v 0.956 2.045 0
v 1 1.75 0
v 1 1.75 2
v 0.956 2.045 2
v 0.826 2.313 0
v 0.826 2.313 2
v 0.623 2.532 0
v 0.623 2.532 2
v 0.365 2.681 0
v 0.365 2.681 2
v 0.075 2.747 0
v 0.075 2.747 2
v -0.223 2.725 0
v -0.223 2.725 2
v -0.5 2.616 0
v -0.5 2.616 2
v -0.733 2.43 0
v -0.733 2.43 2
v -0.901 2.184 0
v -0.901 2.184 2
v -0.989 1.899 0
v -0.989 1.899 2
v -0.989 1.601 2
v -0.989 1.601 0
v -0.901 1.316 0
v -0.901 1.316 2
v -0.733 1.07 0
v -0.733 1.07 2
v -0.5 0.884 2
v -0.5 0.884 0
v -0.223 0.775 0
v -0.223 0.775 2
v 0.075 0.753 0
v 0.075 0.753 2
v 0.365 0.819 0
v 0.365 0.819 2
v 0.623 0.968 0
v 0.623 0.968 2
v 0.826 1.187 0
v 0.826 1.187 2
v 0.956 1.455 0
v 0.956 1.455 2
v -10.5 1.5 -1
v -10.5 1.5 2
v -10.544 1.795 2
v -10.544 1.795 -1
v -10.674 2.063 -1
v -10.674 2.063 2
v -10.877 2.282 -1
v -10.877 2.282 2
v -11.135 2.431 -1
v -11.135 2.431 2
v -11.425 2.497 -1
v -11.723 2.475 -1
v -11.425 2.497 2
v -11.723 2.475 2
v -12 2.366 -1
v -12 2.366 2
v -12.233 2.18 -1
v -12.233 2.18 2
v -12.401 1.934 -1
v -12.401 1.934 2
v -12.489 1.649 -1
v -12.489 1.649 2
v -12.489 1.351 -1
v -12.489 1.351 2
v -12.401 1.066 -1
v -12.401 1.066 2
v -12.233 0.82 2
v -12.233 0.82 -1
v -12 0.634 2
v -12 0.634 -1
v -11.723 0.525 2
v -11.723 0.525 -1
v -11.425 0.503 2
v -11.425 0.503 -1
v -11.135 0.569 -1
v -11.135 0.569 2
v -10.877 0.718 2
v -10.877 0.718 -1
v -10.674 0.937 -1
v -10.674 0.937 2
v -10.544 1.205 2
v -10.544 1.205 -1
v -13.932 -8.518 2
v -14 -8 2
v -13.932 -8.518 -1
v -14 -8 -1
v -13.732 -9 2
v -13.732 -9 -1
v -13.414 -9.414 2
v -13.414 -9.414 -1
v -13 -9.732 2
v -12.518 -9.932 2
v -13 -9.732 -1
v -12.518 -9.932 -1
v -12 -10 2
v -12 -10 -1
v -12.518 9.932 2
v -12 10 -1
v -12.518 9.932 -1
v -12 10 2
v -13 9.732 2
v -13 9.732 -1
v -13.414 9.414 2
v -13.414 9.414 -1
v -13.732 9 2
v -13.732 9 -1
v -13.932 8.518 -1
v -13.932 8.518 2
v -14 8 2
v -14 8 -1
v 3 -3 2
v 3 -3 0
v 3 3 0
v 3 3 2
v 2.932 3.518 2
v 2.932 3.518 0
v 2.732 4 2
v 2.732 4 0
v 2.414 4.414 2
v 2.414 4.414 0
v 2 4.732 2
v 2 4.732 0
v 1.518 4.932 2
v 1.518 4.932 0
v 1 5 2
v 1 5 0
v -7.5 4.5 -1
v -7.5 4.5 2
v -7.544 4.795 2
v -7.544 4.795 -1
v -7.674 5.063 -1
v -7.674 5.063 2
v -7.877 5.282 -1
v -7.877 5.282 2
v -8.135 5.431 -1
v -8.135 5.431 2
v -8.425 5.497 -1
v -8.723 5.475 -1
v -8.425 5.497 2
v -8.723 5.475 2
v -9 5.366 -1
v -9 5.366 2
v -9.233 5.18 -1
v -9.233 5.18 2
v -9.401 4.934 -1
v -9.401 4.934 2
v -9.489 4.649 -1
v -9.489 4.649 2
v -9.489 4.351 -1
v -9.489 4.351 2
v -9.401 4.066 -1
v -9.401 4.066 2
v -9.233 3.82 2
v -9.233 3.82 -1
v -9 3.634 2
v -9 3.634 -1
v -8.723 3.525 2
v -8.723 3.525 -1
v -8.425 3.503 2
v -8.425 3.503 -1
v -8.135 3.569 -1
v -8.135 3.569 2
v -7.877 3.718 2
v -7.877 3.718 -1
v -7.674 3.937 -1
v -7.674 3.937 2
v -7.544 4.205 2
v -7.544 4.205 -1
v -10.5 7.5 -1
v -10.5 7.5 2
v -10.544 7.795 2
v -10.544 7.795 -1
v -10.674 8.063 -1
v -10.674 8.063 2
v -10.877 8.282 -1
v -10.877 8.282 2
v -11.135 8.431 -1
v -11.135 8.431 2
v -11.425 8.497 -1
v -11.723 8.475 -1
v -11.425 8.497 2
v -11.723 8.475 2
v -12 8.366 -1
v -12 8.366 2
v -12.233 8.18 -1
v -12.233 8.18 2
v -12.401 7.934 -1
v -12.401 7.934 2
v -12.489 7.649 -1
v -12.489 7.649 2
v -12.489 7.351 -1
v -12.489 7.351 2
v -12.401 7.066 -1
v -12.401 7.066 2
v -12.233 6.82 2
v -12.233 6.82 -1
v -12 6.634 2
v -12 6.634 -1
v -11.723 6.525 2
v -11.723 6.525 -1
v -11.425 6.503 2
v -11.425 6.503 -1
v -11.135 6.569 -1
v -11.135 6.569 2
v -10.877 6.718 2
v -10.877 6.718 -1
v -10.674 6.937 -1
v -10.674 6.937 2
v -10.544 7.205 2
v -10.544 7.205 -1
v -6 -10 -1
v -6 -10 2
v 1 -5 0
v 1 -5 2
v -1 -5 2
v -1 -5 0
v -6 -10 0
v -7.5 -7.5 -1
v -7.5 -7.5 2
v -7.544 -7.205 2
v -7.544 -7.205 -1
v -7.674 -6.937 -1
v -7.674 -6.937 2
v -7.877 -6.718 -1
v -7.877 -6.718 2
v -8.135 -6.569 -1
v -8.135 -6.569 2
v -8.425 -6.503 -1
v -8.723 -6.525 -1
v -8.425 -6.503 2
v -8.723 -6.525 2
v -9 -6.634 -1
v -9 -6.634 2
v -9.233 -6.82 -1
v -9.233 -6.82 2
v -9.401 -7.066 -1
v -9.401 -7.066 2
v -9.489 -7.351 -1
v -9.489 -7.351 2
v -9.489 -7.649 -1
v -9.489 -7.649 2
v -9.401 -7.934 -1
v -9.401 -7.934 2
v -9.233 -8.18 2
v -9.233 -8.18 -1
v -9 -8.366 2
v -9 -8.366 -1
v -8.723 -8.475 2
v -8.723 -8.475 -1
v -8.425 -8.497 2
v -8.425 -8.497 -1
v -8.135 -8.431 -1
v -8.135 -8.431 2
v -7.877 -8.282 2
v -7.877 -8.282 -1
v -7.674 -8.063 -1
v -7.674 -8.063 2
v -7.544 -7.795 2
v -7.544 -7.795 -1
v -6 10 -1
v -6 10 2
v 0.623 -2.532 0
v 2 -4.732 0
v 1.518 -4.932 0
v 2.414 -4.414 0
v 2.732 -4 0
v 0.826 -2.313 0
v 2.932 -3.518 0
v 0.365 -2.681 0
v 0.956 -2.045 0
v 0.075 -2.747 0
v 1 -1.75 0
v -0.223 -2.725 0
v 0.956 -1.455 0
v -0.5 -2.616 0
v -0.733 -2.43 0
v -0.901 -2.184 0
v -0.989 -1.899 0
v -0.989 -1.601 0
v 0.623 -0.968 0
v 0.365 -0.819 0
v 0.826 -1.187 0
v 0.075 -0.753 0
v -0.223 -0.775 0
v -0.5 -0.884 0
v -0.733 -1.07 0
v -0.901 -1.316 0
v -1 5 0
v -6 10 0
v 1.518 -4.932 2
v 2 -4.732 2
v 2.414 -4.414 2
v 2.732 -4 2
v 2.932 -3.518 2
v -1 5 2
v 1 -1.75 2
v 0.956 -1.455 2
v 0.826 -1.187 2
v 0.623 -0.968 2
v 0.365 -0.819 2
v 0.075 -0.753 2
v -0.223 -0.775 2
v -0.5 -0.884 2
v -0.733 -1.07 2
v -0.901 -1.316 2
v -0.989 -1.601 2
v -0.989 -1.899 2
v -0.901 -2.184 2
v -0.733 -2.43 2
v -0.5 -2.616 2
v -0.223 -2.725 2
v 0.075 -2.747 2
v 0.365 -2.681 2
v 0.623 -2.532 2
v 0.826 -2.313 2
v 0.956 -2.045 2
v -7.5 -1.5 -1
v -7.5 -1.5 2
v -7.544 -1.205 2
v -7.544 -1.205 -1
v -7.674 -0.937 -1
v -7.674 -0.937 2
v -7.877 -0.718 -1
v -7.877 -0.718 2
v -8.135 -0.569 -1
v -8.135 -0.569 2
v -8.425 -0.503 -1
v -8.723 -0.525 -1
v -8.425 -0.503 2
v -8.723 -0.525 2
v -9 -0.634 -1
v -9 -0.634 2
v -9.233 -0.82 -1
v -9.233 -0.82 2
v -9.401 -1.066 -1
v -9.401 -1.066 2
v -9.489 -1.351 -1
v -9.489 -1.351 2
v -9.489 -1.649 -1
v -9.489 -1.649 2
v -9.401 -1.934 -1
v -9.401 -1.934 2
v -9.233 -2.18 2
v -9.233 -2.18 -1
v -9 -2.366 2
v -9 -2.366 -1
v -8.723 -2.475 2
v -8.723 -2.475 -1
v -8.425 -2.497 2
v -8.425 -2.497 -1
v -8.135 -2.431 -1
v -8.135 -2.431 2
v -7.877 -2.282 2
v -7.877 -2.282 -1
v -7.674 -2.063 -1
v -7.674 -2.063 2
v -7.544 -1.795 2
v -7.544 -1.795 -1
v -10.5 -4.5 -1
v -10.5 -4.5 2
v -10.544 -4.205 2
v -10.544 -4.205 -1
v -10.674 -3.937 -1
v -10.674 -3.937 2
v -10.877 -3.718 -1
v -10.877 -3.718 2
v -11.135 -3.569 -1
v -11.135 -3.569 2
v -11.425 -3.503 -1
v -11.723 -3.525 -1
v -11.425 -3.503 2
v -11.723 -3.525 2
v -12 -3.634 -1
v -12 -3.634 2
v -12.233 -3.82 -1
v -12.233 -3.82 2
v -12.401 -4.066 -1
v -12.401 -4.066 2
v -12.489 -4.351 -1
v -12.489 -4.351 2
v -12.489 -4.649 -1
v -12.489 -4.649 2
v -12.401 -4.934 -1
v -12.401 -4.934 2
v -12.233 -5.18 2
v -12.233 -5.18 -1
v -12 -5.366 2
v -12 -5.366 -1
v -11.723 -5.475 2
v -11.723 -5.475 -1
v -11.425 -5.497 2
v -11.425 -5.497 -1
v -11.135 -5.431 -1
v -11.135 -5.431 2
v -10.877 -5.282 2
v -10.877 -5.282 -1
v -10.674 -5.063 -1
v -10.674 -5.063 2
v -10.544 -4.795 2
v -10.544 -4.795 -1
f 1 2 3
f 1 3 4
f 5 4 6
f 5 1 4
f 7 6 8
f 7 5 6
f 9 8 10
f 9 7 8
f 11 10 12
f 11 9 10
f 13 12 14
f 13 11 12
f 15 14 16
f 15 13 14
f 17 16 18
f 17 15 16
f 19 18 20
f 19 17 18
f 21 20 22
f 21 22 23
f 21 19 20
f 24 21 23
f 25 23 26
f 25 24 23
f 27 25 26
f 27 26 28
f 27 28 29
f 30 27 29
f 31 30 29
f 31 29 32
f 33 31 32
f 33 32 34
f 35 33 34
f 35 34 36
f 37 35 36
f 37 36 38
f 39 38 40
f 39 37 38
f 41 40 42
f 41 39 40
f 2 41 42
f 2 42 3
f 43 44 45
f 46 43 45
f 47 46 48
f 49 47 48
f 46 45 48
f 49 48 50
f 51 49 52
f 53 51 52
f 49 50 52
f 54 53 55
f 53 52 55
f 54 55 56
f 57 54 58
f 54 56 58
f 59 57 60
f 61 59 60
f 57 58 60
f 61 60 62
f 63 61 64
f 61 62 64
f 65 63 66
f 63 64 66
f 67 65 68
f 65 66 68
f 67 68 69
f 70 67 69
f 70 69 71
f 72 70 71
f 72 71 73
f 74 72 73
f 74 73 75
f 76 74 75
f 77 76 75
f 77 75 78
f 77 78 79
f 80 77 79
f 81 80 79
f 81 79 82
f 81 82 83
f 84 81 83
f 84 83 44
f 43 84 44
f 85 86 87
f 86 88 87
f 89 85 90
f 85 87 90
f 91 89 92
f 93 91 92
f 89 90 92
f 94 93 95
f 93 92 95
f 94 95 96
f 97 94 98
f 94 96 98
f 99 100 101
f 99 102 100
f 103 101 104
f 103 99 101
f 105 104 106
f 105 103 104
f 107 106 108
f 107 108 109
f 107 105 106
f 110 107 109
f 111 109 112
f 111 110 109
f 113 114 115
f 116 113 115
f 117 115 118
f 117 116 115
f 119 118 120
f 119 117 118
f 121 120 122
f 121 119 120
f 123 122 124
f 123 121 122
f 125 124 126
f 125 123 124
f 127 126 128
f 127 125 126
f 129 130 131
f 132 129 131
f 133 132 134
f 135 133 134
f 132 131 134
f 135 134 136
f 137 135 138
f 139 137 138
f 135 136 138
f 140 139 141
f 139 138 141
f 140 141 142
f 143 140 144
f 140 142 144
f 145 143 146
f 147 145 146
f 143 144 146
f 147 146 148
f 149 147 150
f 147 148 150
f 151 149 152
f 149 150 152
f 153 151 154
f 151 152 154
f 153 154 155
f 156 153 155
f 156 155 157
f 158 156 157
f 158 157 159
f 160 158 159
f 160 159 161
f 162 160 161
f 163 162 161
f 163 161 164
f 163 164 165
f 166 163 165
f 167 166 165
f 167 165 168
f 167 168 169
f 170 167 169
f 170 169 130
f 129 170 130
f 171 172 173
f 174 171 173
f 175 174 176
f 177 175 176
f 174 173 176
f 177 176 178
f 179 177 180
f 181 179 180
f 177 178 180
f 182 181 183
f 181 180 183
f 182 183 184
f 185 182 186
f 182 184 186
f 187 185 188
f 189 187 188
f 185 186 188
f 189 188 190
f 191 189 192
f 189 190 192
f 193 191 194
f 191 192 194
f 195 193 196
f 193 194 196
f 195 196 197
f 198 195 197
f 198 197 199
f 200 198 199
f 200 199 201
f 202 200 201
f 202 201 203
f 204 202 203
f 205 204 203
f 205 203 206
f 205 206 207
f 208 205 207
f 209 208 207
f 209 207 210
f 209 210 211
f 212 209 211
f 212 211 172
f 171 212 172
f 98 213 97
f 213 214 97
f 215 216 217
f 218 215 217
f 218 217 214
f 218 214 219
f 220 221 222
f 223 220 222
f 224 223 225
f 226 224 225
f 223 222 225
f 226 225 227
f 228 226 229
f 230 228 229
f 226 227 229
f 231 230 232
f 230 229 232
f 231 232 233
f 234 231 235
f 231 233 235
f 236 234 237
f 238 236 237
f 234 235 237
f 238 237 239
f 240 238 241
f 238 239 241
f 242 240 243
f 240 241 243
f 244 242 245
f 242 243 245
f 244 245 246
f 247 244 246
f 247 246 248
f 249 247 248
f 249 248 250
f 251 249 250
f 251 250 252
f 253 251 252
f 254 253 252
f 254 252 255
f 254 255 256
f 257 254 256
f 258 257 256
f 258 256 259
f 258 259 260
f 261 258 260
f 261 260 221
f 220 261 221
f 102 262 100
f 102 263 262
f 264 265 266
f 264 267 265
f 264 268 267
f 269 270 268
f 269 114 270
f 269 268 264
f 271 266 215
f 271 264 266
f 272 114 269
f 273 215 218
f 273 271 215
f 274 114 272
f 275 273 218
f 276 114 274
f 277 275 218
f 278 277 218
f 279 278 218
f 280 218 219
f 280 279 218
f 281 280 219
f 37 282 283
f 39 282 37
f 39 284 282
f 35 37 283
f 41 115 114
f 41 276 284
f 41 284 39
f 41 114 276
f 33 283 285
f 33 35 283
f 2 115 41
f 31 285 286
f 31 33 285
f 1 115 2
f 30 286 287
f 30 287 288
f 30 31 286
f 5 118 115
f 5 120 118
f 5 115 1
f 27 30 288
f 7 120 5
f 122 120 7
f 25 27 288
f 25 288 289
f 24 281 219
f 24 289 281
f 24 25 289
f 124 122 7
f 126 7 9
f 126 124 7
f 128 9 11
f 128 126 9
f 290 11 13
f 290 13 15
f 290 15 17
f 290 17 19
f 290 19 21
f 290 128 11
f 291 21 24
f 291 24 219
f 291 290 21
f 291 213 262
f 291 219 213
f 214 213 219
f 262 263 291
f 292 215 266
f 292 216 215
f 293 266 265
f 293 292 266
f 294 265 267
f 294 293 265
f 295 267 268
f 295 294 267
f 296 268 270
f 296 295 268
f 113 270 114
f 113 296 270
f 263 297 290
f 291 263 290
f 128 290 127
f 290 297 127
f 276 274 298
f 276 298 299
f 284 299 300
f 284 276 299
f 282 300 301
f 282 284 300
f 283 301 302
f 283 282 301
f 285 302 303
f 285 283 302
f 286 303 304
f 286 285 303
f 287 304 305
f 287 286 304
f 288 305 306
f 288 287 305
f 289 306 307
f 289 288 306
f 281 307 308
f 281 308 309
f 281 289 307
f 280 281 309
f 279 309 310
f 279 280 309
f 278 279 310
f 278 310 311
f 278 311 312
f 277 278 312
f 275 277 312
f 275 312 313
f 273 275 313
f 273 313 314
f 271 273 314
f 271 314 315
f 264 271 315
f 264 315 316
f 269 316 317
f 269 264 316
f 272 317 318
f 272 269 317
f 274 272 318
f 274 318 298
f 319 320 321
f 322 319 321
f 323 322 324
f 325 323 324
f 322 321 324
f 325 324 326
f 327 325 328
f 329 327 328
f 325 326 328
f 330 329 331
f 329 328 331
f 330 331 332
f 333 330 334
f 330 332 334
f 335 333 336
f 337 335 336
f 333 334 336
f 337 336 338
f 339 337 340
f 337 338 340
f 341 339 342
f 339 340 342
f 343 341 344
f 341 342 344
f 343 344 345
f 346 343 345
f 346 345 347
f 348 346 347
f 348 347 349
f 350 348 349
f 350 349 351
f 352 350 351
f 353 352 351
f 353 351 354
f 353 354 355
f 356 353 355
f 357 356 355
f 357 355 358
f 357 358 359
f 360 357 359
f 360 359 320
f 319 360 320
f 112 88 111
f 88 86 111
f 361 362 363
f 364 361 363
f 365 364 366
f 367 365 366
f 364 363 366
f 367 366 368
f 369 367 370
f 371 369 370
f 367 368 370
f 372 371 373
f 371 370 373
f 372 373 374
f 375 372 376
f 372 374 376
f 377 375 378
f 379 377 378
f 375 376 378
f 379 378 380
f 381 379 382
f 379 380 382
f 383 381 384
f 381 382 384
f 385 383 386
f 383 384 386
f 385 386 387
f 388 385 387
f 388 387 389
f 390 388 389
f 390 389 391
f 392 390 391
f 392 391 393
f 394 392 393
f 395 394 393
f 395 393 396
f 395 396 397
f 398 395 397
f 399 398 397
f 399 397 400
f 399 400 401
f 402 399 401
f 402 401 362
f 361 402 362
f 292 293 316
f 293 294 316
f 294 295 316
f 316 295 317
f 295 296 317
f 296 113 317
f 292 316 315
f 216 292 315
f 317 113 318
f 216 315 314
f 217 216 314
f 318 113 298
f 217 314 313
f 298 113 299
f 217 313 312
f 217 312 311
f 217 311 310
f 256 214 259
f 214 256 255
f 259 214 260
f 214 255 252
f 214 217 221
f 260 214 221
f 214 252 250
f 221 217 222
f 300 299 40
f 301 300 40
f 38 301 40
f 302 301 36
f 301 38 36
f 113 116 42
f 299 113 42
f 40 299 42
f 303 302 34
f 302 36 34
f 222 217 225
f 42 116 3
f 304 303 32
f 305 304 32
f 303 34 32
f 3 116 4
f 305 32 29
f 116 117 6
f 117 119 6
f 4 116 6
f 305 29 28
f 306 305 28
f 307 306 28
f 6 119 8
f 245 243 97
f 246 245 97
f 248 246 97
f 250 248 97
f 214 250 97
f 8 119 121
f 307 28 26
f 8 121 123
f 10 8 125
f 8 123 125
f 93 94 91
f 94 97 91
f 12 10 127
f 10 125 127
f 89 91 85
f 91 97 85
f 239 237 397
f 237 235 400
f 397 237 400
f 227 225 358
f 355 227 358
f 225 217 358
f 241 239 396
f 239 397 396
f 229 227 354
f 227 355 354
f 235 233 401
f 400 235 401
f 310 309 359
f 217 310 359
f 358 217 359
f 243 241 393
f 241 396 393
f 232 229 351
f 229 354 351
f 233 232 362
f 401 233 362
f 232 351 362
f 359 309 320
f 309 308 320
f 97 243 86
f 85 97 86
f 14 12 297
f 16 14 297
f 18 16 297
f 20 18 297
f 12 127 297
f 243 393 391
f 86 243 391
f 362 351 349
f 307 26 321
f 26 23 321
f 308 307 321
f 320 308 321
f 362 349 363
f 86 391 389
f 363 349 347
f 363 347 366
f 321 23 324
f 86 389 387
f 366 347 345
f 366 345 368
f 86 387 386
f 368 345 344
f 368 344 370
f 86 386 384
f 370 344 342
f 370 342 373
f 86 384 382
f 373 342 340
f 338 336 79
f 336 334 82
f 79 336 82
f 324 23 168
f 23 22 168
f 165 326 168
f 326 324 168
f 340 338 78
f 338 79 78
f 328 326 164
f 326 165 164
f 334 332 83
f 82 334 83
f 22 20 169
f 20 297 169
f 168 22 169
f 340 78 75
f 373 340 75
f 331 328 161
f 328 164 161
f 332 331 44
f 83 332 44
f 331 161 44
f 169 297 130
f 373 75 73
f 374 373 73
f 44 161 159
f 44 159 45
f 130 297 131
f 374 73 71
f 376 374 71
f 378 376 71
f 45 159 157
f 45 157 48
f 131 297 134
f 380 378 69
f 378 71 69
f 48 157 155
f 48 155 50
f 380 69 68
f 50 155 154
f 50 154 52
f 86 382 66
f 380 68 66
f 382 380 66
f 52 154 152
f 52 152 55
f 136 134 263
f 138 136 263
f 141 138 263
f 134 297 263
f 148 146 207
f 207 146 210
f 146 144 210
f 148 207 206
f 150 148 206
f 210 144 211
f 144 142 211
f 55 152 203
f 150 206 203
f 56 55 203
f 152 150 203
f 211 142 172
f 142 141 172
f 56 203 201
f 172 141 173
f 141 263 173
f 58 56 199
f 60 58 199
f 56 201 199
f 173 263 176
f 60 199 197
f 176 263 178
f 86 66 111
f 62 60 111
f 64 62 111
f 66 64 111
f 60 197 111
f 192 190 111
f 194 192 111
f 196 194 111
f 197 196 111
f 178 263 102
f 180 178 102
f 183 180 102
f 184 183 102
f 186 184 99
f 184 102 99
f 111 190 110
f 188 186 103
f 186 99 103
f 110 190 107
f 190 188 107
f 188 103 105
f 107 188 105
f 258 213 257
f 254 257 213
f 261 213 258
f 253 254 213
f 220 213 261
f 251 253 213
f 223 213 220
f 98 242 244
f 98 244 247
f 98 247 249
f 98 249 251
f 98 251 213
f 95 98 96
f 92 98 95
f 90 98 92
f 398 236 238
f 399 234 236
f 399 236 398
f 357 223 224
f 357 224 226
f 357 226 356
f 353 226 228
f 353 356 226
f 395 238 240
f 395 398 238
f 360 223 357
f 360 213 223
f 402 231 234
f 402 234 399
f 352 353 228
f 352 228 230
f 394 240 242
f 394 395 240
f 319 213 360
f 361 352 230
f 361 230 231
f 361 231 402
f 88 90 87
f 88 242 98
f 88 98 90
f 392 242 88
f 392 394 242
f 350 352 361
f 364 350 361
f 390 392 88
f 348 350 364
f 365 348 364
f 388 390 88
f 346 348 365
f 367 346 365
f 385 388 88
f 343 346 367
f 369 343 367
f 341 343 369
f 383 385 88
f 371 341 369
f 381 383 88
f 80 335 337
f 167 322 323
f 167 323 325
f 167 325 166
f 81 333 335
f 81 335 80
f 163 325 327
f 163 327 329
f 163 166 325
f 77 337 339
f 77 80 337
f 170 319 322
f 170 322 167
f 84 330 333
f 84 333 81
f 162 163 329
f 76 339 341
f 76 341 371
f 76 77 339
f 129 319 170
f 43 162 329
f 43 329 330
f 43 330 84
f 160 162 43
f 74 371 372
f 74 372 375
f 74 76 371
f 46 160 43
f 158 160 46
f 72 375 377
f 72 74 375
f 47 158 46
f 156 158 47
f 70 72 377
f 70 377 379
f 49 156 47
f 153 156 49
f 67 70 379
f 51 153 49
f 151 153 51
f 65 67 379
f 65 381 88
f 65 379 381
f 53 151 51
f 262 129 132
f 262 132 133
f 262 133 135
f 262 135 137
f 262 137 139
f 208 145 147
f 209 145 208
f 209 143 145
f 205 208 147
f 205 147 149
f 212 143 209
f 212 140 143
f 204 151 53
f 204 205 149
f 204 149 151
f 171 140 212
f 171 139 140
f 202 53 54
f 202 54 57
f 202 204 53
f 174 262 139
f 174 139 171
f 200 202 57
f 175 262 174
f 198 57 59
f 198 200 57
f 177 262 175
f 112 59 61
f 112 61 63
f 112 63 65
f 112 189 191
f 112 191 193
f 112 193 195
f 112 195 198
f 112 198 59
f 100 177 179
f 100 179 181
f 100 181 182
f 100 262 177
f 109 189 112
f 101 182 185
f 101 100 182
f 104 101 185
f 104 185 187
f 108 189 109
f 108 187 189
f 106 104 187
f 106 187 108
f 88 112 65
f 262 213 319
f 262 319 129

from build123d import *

# Parameters (mm, degrees)
SKETCH1_W           = 6
SKETCH1_H           = 10
SKETCH1_R           = 1
BOSS_EXTRUDE1_DEPTH = 2
BOSS_EXTRUDE2_DEPTH = 2
SKETCH3_W           = 8
SKETCH3_H           = 20
BOSS_EXTRUDE3_DEPTH = 1
SKETCH4_R           = 1
CUT_EXTRUDE1_DEPTH  = 5
LPATTERN1_COUNT     = 3
LPATTERN1_PITCH     = 6
CHAMFER1_SIZE       = 5
FILLET1_R           = 2


with BuildPart() as part:
    # Sketch1 → Boss-Extrude1 (new body)
    with BuildSketch(Plane.XY):
        Rectangle(SKETCH1_W, SKETCH1_H)
        with Locations((0, 1.75)):
            Circle(SKETCH1_R, mode=Mode.SUBTRACT)
        with Locations((0, -1.75)):
            Circle(SKETCH1_R, mode=Mode.SUBTRACT)
    extrude(amount=BOSS_EXTRUDE1_DEPTH)

    # Sketch2 → Boss-Extrude2 (add)
    with BuildSketch(Plane.XY.offset(2)):
        Polygon((-14, -10), (-14, 10), (-6, 10), (-6, 5), (-3, 5), (-3, -5), (-6, -5), (-6, -10), align=None)
    extrude(amount=-BOSS_EXTRUDE2_DEPTH)

    # Sketch3 → Boss-Extrude3 (add)
    with BuildSketch(Plane(origin=(0, 0, 0), x_dir=(-1, 0, 0), z_dir=(0, 0, -1))):
        with Locations((10, 0)):
            Rectangle(SKETCH3_W, SKETCH3_H)
    extrude(amount=BOSS_EXTRUDE3_DEPTH)

    # Sketch4 → Cut-Extrude1 (cut)
    with BuildSketch(Plane.XY.offset(2)):
        with Locations((-8.5, -7.5)):
            Circle(SKETCH4_R)
        with Locations((-11.5, -4.5)):
            Circle(SKETCH4_R)
    cut_extrude1 = extrude(amount=-CUT_EXTRUDE1_DEPTH, mode=Mode.SUBTRACT)

    # LPattern1: Cut-Extrude1 ×3
    with Locations(*[(0, i * LPATTERN1_PITCH, 0) for i in range(1, LPATTERN1_COUNT)]):
        add(cut_extrude1, mode=Mode.SUBTRACT)

    # Chamfer1
    chamfer1_edges = [part.edges().sort_by_distance(p)[0] for p in [
        (-6, 5, 1),
        (-6, -5, 1),
    ]]
    chamfer(chamfer1_edges, length=CHAMFER1_SIZE - 0.0001)  # a hair under: the kernel refuses the full size

    # Fillet1
    fillet1_edges = [part.edges().sort_by_distance(p)[0] for p in [
        (-14, -10, 0.5),
        (-14, 10, 0.5),
        (3, -5, 1),
        (3, 5, 1),
    ]]
    fillet(fillet1_edges, radius=FILLET1_R)


solid = part.part
